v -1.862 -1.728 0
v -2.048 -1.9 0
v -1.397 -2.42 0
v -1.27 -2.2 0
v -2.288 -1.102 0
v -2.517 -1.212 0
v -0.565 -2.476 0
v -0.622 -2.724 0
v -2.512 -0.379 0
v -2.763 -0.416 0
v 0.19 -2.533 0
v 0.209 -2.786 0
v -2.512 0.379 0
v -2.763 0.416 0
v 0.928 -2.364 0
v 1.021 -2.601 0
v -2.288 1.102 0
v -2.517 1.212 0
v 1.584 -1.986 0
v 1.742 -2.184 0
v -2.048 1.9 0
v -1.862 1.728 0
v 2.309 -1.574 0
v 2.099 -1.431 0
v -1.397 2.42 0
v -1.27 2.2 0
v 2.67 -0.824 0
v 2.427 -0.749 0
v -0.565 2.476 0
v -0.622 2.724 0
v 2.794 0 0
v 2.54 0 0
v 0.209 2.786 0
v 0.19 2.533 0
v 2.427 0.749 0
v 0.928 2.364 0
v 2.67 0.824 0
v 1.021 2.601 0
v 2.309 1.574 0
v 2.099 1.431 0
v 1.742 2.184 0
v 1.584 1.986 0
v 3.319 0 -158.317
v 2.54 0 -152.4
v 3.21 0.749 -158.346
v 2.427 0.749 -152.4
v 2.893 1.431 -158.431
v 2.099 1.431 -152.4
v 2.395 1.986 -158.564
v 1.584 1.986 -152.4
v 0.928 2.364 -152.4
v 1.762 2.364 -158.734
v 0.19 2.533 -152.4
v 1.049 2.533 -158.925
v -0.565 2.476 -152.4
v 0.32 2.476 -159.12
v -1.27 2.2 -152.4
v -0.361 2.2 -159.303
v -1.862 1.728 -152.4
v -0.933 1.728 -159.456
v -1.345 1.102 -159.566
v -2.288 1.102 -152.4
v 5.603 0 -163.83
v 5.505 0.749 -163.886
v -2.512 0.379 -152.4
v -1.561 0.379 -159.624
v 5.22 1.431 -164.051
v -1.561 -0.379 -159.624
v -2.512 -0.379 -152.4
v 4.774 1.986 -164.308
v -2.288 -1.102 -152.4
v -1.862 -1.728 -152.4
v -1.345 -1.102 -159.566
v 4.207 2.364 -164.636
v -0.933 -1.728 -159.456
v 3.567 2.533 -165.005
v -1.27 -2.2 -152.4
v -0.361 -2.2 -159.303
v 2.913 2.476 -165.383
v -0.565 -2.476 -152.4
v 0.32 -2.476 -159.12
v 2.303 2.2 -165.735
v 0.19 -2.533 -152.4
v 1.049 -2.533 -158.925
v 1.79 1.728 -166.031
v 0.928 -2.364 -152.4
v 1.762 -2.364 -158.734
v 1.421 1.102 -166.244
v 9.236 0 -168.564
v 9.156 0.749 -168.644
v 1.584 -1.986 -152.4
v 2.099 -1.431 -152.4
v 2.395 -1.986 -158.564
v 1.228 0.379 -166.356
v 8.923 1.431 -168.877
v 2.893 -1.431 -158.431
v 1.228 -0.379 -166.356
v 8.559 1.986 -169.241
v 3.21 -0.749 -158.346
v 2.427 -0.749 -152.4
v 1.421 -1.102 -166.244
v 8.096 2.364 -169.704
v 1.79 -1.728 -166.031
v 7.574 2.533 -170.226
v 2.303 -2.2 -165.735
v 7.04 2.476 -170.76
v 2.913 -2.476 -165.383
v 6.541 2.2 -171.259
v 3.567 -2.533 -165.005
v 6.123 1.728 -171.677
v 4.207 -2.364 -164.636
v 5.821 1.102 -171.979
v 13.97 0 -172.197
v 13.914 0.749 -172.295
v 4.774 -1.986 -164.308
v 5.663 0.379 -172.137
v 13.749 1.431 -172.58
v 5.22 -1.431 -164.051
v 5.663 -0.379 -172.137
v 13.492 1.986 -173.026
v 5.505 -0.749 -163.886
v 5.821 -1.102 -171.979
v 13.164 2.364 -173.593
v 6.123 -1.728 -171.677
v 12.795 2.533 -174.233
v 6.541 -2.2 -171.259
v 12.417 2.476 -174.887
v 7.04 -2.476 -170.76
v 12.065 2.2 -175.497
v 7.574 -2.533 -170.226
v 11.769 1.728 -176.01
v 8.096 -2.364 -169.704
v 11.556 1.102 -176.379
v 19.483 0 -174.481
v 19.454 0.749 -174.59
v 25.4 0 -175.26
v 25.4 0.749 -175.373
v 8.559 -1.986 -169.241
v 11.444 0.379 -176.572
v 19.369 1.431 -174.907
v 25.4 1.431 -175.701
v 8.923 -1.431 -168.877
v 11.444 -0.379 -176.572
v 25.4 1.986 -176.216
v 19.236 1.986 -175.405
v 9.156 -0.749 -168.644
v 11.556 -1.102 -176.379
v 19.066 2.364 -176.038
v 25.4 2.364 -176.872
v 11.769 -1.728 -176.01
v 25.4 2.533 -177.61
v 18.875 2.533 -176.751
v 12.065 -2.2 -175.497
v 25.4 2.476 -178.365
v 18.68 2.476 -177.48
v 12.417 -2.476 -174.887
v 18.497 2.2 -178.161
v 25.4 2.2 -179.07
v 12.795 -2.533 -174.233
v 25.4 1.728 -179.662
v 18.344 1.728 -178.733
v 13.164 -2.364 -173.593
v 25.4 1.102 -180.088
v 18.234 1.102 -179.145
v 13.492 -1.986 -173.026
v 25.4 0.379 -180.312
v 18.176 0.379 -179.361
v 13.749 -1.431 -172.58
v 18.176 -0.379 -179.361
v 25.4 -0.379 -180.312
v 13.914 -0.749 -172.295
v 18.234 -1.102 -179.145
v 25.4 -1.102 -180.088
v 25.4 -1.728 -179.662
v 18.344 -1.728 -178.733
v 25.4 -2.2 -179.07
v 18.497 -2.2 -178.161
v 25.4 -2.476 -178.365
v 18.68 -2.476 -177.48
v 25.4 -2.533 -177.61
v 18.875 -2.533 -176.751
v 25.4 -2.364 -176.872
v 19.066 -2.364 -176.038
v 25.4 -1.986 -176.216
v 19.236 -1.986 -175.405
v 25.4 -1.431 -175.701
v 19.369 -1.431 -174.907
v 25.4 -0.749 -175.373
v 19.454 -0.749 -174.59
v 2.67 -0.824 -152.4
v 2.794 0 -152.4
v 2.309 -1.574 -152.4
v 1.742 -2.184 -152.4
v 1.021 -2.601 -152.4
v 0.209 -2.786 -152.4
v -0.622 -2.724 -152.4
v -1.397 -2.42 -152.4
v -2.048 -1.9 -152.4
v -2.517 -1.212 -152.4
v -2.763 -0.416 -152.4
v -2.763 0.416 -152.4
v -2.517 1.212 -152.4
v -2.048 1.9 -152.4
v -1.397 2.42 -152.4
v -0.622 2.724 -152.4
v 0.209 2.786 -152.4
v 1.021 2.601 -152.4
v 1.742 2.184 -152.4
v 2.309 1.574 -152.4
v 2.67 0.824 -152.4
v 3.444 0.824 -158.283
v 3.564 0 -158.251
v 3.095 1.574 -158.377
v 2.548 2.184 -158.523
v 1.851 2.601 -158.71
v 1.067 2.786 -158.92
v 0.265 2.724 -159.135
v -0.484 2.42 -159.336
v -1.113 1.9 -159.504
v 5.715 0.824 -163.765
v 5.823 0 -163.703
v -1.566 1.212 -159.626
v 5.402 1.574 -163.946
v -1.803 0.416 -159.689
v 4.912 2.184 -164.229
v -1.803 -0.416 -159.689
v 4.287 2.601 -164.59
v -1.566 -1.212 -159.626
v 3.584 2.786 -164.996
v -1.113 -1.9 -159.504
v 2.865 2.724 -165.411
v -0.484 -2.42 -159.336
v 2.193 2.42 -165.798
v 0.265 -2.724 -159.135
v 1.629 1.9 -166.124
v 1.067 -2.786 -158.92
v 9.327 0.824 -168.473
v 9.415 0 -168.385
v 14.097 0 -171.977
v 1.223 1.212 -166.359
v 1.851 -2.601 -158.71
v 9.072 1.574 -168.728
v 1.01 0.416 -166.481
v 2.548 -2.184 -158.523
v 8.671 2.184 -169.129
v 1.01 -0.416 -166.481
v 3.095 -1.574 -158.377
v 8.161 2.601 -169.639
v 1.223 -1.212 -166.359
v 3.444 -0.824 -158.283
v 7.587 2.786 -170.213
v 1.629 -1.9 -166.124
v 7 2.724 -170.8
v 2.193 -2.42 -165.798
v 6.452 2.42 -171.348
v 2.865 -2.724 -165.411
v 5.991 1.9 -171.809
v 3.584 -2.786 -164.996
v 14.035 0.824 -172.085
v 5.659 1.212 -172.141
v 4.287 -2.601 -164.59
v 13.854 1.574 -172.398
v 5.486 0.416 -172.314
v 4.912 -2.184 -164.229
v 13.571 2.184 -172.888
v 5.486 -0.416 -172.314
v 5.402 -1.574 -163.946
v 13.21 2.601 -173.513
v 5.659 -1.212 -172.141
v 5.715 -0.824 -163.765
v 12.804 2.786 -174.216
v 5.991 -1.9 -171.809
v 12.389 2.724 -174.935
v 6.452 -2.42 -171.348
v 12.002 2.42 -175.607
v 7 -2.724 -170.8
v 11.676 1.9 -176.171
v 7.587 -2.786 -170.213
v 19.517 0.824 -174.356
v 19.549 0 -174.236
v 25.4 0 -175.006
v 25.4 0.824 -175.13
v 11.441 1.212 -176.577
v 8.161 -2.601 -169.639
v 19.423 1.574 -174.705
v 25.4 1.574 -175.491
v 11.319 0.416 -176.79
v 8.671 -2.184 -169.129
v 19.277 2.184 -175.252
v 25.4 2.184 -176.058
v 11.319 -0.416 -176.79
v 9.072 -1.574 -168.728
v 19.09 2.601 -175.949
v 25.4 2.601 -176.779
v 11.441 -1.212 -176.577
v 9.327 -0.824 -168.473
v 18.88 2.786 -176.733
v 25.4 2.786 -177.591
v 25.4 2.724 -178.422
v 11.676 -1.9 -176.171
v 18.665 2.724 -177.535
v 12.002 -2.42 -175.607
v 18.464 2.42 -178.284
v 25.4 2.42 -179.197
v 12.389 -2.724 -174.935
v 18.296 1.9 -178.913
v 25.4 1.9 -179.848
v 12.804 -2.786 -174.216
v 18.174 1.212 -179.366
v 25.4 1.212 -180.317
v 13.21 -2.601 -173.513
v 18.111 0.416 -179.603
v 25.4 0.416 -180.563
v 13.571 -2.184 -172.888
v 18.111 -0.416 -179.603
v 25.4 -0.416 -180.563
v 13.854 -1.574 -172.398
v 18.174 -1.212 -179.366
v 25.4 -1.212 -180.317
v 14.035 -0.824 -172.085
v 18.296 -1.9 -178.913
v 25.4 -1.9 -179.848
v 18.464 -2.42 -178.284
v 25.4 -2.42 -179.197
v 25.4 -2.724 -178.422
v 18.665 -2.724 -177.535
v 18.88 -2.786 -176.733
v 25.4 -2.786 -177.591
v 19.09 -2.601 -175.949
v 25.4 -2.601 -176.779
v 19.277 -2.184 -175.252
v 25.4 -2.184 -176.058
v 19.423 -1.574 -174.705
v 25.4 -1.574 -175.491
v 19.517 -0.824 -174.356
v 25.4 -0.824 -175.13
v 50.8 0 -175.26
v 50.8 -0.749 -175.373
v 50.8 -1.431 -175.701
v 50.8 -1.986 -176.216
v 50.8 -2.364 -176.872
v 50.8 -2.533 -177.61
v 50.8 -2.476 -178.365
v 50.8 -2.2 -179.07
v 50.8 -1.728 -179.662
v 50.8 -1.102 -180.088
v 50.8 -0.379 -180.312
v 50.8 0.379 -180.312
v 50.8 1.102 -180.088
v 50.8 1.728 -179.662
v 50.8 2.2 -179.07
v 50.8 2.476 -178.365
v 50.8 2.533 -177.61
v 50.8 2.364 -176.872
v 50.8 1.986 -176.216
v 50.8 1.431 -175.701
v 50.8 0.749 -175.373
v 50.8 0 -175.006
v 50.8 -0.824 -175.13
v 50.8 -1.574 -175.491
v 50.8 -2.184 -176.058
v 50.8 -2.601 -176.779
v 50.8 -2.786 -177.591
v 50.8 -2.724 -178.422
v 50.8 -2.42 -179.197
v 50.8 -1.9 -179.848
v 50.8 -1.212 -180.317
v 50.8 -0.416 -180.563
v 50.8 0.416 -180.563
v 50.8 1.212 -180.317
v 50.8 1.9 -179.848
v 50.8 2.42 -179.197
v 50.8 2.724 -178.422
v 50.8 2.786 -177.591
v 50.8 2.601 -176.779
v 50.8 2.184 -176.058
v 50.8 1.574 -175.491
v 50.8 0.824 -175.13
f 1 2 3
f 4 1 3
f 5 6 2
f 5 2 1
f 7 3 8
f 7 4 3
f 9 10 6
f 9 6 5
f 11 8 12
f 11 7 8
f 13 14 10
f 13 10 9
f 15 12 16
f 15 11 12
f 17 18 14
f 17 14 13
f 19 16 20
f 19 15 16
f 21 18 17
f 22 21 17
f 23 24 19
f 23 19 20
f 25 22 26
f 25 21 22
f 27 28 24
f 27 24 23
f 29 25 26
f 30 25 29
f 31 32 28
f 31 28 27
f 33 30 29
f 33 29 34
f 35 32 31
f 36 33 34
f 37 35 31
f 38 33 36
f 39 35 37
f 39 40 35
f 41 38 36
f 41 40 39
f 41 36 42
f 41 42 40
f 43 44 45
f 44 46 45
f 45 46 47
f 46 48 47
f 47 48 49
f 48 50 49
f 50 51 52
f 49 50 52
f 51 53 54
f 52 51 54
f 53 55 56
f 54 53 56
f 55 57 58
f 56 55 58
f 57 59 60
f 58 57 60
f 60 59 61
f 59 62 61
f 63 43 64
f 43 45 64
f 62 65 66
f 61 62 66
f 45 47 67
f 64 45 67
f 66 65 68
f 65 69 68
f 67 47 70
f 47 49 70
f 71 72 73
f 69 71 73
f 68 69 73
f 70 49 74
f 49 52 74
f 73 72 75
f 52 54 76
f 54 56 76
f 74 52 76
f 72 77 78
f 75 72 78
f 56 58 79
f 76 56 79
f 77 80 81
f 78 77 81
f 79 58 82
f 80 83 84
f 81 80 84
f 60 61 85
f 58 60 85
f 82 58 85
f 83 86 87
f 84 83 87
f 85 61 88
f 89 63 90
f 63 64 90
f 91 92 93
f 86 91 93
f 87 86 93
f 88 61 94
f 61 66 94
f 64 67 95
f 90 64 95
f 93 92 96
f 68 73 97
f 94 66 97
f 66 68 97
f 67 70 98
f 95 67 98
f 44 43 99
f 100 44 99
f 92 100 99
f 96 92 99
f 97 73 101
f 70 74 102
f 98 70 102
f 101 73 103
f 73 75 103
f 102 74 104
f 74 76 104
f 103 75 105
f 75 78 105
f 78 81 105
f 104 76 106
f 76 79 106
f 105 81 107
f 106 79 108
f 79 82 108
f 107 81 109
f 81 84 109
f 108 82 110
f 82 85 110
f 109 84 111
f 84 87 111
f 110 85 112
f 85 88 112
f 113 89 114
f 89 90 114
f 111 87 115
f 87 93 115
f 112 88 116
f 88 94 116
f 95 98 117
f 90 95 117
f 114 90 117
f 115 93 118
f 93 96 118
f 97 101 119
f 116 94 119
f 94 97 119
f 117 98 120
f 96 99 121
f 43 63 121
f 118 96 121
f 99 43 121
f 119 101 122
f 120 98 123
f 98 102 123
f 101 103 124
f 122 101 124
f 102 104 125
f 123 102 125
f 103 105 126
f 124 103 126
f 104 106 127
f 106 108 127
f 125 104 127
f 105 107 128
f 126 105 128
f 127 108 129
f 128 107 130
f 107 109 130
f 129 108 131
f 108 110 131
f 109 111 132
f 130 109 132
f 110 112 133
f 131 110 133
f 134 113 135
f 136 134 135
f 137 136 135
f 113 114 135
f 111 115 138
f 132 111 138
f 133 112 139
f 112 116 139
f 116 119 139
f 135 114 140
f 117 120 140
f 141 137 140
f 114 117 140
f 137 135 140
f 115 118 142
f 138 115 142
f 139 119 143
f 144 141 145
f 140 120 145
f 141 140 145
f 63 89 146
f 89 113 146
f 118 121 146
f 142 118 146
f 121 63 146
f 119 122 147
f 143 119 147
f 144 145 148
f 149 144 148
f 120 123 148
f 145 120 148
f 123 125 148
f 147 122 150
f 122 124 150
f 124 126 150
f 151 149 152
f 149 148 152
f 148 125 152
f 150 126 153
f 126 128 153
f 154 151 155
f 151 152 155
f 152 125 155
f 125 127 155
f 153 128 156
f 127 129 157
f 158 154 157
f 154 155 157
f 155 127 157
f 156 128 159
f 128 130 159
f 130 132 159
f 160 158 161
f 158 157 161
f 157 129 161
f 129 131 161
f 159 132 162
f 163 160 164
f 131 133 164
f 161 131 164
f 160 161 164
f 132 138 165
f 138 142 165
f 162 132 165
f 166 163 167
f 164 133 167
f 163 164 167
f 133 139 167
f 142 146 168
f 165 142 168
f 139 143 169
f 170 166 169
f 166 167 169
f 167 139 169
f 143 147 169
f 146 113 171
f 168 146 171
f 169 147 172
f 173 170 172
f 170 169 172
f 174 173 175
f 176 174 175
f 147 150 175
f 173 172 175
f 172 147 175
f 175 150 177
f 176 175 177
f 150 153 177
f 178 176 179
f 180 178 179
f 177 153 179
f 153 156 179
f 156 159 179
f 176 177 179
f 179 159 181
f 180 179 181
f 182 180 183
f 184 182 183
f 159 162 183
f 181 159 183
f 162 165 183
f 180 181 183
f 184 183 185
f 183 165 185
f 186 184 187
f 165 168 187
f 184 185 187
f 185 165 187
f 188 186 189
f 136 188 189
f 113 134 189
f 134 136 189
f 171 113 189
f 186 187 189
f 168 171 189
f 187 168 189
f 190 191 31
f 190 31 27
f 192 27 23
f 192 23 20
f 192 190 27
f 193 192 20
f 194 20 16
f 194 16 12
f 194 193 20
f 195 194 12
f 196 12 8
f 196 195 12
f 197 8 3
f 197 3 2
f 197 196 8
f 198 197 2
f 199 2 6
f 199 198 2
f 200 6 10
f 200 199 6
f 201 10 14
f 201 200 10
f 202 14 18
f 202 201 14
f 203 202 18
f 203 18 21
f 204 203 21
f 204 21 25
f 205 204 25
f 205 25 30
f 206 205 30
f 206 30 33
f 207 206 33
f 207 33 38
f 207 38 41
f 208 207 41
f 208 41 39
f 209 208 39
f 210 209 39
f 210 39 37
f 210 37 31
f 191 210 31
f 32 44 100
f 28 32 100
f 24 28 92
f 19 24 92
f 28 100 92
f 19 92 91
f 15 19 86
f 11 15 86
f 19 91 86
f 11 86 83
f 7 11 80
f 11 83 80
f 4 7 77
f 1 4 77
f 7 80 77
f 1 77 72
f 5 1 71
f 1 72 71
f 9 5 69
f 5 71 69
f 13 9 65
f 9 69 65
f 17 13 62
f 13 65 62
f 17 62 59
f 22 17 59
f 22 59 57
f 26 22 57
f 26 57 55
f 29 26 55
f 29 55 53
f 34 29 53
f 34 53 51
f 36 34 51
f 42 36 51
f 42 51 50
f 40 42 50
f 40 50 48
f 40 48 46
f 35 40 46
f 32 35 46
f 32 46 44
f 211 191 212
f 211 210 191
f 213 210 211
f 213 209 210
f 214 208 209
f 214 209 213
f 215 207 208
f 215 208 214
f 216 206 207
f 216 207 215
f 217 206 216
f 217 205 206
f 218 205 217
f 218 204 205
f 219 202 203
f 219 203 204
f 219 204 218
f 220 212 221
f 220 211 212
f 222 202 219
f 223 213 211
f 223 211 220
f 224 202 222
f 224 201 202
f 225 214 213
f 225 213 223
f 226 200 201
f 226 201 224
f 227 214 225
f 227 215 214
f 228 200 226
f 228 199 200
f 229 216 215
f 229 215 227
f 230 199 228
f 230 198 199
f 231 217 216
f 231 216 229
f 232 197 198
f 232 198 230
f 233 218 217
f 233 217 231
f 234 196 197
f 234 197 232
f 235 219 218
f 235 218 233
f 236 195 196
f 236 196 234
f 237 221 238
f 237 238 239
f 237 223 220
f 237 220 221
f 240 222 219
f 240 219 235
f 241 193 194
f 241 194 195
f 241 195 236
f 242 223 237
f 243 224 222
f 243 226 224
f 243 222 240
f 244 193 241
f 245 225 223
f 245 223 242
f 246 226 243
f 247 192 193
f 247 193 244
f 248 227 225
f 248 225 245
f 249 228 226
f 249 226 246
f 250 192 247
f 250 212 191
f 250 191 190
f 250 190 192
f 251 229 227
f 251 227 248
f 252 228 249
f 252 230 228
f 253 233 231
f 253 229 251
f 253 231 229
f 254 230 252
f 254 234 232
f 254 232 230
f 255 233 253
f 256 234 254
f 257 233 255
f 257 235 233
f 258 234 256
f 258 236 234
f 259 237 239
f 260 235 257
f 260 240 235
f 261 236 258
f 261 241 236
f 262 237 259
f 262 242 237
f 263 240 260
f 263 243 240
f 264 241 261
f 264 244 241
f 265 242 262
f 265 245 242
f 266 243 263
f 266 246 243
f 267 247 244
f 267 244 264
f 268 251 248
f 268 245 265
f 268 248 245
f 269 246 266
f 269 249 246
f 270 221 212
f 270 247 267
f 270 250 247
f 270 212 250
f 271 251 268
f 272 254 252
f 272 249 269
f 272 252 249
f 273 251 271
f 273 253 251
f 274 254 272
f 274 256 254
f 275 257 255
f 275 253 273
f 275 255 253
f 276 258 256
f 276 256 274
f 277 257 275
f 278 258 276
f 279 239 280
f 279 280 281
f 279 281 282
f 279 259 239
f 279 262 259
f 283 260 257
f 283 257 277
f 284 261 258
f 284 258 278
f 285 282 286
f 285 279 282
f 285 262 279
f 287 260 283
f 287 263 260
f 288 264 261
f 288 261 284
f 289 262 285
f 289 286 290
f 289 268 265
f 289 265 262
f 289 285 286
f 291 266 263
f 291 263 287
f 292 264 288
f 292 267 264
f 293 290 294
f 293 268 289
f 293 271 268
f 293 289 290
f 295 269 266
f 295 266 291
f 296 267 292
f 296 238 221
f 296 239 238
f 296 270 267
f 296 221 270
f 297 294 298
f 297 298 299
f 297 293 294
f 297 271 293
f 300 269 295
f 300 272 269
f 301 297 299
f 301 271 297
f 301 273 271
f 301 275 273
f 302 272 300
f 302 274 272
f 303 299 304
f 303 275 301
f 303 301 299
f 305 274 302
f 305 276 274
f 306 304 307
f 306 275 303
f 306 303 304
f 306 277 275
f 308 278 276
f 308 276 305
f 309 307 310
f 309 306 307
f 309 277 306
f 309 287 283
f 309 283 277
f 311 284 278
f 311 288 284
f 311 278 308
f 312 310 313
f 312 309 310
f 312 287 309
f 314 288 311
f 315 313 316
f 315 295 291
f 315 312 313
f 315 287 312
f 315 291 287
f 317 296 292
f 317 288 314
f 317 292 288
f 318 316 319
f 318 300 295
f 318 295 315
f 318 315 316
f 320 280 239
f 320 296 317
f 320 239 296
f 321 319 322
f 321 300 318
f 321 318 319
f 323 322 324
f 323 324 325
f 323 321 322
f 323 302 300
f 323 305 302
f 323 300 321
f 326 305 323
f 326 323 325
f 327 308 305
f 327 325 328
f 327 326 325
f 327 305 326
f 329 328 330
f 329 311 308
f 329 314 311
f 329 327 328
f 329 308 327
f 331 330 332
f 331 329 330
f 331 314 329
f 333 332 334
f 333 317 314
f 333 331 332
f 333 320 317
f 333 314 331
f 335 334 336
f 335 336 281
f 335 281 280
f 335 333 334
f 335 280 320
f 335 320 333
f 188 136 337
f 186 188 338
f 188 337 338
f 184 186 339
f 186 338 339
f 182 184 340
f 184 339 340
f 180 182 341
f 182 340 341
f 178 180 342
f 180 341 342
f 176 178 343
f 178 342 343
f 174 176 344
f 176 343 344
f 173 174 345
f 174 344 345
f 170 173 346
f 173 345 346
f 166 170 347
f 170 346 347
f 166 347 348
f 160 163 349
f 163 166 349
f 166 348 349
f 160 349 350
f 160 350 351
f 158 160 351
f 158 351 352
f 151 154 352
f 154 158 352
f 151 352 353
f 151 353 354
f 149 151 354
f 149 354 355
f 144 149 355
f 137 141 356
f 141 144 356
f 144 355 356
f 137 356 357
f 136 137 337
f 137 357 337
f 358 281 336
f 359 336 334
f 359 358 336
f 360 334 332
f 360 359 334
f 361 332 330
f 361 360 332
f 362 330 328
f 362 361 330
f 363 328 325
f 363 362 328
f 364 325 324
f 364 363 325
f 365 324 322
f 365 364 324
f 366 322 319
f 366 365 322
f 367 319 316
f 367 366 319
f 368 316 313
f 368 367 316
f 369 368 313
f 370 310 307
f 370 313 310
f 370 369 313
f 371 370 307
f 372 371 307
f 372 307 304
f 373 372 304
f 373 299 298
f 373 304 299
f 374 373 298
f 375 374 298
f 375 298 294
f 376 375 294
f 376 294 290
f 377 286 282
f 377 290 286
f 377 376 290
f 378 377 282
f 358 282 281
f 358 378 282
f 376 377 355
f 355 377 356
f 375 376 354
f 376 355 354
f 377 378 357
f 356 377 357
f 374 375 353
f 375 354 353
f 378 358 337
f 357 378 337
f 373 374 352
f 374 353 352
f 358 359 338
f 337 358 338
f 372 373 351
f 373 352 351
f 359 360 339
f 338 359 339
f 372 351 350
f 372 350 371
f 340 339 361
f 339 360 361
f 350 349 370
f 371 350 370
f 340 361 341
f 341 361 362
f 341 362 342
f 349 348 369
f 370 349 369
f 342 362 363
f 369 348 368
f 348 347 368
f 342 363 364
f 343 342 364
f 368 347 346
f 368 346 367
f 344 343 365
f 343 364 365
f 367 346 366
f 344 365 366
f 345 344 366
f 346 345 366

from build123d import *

# Parameters (mm, degrees)
SKETCH4_R   = 2.794
SKETCH4_R_2 = 2.54


with BuildPart() as part:
    # Sweep-Thin1: sweep along a path in Sketch2
    with BuildLine(Plane(origin=(0, 0, 0), x_dir=(1, 0, 0), z_dir=(0, 1, 0))) as sweep_thin1_path:
        Line((0, 0), (0, 152.4))
        ThreePointArc((0, 152.4), (7.439487758, 170.360512242), (25.4, 177.8))
        Line((25.4, 177.8), (50.8, 177.8))
    # Sketch4 → Sweep-Thin1 (sweep)
    with BuildSketch(Plane.XY):
        Circle(SKETCH4_R)
        Circle(SKETCH4_R_2, mode=Mode.SUBTRACT)
    sweep(path=sweep_thin1_path.line)


solid = part.part
